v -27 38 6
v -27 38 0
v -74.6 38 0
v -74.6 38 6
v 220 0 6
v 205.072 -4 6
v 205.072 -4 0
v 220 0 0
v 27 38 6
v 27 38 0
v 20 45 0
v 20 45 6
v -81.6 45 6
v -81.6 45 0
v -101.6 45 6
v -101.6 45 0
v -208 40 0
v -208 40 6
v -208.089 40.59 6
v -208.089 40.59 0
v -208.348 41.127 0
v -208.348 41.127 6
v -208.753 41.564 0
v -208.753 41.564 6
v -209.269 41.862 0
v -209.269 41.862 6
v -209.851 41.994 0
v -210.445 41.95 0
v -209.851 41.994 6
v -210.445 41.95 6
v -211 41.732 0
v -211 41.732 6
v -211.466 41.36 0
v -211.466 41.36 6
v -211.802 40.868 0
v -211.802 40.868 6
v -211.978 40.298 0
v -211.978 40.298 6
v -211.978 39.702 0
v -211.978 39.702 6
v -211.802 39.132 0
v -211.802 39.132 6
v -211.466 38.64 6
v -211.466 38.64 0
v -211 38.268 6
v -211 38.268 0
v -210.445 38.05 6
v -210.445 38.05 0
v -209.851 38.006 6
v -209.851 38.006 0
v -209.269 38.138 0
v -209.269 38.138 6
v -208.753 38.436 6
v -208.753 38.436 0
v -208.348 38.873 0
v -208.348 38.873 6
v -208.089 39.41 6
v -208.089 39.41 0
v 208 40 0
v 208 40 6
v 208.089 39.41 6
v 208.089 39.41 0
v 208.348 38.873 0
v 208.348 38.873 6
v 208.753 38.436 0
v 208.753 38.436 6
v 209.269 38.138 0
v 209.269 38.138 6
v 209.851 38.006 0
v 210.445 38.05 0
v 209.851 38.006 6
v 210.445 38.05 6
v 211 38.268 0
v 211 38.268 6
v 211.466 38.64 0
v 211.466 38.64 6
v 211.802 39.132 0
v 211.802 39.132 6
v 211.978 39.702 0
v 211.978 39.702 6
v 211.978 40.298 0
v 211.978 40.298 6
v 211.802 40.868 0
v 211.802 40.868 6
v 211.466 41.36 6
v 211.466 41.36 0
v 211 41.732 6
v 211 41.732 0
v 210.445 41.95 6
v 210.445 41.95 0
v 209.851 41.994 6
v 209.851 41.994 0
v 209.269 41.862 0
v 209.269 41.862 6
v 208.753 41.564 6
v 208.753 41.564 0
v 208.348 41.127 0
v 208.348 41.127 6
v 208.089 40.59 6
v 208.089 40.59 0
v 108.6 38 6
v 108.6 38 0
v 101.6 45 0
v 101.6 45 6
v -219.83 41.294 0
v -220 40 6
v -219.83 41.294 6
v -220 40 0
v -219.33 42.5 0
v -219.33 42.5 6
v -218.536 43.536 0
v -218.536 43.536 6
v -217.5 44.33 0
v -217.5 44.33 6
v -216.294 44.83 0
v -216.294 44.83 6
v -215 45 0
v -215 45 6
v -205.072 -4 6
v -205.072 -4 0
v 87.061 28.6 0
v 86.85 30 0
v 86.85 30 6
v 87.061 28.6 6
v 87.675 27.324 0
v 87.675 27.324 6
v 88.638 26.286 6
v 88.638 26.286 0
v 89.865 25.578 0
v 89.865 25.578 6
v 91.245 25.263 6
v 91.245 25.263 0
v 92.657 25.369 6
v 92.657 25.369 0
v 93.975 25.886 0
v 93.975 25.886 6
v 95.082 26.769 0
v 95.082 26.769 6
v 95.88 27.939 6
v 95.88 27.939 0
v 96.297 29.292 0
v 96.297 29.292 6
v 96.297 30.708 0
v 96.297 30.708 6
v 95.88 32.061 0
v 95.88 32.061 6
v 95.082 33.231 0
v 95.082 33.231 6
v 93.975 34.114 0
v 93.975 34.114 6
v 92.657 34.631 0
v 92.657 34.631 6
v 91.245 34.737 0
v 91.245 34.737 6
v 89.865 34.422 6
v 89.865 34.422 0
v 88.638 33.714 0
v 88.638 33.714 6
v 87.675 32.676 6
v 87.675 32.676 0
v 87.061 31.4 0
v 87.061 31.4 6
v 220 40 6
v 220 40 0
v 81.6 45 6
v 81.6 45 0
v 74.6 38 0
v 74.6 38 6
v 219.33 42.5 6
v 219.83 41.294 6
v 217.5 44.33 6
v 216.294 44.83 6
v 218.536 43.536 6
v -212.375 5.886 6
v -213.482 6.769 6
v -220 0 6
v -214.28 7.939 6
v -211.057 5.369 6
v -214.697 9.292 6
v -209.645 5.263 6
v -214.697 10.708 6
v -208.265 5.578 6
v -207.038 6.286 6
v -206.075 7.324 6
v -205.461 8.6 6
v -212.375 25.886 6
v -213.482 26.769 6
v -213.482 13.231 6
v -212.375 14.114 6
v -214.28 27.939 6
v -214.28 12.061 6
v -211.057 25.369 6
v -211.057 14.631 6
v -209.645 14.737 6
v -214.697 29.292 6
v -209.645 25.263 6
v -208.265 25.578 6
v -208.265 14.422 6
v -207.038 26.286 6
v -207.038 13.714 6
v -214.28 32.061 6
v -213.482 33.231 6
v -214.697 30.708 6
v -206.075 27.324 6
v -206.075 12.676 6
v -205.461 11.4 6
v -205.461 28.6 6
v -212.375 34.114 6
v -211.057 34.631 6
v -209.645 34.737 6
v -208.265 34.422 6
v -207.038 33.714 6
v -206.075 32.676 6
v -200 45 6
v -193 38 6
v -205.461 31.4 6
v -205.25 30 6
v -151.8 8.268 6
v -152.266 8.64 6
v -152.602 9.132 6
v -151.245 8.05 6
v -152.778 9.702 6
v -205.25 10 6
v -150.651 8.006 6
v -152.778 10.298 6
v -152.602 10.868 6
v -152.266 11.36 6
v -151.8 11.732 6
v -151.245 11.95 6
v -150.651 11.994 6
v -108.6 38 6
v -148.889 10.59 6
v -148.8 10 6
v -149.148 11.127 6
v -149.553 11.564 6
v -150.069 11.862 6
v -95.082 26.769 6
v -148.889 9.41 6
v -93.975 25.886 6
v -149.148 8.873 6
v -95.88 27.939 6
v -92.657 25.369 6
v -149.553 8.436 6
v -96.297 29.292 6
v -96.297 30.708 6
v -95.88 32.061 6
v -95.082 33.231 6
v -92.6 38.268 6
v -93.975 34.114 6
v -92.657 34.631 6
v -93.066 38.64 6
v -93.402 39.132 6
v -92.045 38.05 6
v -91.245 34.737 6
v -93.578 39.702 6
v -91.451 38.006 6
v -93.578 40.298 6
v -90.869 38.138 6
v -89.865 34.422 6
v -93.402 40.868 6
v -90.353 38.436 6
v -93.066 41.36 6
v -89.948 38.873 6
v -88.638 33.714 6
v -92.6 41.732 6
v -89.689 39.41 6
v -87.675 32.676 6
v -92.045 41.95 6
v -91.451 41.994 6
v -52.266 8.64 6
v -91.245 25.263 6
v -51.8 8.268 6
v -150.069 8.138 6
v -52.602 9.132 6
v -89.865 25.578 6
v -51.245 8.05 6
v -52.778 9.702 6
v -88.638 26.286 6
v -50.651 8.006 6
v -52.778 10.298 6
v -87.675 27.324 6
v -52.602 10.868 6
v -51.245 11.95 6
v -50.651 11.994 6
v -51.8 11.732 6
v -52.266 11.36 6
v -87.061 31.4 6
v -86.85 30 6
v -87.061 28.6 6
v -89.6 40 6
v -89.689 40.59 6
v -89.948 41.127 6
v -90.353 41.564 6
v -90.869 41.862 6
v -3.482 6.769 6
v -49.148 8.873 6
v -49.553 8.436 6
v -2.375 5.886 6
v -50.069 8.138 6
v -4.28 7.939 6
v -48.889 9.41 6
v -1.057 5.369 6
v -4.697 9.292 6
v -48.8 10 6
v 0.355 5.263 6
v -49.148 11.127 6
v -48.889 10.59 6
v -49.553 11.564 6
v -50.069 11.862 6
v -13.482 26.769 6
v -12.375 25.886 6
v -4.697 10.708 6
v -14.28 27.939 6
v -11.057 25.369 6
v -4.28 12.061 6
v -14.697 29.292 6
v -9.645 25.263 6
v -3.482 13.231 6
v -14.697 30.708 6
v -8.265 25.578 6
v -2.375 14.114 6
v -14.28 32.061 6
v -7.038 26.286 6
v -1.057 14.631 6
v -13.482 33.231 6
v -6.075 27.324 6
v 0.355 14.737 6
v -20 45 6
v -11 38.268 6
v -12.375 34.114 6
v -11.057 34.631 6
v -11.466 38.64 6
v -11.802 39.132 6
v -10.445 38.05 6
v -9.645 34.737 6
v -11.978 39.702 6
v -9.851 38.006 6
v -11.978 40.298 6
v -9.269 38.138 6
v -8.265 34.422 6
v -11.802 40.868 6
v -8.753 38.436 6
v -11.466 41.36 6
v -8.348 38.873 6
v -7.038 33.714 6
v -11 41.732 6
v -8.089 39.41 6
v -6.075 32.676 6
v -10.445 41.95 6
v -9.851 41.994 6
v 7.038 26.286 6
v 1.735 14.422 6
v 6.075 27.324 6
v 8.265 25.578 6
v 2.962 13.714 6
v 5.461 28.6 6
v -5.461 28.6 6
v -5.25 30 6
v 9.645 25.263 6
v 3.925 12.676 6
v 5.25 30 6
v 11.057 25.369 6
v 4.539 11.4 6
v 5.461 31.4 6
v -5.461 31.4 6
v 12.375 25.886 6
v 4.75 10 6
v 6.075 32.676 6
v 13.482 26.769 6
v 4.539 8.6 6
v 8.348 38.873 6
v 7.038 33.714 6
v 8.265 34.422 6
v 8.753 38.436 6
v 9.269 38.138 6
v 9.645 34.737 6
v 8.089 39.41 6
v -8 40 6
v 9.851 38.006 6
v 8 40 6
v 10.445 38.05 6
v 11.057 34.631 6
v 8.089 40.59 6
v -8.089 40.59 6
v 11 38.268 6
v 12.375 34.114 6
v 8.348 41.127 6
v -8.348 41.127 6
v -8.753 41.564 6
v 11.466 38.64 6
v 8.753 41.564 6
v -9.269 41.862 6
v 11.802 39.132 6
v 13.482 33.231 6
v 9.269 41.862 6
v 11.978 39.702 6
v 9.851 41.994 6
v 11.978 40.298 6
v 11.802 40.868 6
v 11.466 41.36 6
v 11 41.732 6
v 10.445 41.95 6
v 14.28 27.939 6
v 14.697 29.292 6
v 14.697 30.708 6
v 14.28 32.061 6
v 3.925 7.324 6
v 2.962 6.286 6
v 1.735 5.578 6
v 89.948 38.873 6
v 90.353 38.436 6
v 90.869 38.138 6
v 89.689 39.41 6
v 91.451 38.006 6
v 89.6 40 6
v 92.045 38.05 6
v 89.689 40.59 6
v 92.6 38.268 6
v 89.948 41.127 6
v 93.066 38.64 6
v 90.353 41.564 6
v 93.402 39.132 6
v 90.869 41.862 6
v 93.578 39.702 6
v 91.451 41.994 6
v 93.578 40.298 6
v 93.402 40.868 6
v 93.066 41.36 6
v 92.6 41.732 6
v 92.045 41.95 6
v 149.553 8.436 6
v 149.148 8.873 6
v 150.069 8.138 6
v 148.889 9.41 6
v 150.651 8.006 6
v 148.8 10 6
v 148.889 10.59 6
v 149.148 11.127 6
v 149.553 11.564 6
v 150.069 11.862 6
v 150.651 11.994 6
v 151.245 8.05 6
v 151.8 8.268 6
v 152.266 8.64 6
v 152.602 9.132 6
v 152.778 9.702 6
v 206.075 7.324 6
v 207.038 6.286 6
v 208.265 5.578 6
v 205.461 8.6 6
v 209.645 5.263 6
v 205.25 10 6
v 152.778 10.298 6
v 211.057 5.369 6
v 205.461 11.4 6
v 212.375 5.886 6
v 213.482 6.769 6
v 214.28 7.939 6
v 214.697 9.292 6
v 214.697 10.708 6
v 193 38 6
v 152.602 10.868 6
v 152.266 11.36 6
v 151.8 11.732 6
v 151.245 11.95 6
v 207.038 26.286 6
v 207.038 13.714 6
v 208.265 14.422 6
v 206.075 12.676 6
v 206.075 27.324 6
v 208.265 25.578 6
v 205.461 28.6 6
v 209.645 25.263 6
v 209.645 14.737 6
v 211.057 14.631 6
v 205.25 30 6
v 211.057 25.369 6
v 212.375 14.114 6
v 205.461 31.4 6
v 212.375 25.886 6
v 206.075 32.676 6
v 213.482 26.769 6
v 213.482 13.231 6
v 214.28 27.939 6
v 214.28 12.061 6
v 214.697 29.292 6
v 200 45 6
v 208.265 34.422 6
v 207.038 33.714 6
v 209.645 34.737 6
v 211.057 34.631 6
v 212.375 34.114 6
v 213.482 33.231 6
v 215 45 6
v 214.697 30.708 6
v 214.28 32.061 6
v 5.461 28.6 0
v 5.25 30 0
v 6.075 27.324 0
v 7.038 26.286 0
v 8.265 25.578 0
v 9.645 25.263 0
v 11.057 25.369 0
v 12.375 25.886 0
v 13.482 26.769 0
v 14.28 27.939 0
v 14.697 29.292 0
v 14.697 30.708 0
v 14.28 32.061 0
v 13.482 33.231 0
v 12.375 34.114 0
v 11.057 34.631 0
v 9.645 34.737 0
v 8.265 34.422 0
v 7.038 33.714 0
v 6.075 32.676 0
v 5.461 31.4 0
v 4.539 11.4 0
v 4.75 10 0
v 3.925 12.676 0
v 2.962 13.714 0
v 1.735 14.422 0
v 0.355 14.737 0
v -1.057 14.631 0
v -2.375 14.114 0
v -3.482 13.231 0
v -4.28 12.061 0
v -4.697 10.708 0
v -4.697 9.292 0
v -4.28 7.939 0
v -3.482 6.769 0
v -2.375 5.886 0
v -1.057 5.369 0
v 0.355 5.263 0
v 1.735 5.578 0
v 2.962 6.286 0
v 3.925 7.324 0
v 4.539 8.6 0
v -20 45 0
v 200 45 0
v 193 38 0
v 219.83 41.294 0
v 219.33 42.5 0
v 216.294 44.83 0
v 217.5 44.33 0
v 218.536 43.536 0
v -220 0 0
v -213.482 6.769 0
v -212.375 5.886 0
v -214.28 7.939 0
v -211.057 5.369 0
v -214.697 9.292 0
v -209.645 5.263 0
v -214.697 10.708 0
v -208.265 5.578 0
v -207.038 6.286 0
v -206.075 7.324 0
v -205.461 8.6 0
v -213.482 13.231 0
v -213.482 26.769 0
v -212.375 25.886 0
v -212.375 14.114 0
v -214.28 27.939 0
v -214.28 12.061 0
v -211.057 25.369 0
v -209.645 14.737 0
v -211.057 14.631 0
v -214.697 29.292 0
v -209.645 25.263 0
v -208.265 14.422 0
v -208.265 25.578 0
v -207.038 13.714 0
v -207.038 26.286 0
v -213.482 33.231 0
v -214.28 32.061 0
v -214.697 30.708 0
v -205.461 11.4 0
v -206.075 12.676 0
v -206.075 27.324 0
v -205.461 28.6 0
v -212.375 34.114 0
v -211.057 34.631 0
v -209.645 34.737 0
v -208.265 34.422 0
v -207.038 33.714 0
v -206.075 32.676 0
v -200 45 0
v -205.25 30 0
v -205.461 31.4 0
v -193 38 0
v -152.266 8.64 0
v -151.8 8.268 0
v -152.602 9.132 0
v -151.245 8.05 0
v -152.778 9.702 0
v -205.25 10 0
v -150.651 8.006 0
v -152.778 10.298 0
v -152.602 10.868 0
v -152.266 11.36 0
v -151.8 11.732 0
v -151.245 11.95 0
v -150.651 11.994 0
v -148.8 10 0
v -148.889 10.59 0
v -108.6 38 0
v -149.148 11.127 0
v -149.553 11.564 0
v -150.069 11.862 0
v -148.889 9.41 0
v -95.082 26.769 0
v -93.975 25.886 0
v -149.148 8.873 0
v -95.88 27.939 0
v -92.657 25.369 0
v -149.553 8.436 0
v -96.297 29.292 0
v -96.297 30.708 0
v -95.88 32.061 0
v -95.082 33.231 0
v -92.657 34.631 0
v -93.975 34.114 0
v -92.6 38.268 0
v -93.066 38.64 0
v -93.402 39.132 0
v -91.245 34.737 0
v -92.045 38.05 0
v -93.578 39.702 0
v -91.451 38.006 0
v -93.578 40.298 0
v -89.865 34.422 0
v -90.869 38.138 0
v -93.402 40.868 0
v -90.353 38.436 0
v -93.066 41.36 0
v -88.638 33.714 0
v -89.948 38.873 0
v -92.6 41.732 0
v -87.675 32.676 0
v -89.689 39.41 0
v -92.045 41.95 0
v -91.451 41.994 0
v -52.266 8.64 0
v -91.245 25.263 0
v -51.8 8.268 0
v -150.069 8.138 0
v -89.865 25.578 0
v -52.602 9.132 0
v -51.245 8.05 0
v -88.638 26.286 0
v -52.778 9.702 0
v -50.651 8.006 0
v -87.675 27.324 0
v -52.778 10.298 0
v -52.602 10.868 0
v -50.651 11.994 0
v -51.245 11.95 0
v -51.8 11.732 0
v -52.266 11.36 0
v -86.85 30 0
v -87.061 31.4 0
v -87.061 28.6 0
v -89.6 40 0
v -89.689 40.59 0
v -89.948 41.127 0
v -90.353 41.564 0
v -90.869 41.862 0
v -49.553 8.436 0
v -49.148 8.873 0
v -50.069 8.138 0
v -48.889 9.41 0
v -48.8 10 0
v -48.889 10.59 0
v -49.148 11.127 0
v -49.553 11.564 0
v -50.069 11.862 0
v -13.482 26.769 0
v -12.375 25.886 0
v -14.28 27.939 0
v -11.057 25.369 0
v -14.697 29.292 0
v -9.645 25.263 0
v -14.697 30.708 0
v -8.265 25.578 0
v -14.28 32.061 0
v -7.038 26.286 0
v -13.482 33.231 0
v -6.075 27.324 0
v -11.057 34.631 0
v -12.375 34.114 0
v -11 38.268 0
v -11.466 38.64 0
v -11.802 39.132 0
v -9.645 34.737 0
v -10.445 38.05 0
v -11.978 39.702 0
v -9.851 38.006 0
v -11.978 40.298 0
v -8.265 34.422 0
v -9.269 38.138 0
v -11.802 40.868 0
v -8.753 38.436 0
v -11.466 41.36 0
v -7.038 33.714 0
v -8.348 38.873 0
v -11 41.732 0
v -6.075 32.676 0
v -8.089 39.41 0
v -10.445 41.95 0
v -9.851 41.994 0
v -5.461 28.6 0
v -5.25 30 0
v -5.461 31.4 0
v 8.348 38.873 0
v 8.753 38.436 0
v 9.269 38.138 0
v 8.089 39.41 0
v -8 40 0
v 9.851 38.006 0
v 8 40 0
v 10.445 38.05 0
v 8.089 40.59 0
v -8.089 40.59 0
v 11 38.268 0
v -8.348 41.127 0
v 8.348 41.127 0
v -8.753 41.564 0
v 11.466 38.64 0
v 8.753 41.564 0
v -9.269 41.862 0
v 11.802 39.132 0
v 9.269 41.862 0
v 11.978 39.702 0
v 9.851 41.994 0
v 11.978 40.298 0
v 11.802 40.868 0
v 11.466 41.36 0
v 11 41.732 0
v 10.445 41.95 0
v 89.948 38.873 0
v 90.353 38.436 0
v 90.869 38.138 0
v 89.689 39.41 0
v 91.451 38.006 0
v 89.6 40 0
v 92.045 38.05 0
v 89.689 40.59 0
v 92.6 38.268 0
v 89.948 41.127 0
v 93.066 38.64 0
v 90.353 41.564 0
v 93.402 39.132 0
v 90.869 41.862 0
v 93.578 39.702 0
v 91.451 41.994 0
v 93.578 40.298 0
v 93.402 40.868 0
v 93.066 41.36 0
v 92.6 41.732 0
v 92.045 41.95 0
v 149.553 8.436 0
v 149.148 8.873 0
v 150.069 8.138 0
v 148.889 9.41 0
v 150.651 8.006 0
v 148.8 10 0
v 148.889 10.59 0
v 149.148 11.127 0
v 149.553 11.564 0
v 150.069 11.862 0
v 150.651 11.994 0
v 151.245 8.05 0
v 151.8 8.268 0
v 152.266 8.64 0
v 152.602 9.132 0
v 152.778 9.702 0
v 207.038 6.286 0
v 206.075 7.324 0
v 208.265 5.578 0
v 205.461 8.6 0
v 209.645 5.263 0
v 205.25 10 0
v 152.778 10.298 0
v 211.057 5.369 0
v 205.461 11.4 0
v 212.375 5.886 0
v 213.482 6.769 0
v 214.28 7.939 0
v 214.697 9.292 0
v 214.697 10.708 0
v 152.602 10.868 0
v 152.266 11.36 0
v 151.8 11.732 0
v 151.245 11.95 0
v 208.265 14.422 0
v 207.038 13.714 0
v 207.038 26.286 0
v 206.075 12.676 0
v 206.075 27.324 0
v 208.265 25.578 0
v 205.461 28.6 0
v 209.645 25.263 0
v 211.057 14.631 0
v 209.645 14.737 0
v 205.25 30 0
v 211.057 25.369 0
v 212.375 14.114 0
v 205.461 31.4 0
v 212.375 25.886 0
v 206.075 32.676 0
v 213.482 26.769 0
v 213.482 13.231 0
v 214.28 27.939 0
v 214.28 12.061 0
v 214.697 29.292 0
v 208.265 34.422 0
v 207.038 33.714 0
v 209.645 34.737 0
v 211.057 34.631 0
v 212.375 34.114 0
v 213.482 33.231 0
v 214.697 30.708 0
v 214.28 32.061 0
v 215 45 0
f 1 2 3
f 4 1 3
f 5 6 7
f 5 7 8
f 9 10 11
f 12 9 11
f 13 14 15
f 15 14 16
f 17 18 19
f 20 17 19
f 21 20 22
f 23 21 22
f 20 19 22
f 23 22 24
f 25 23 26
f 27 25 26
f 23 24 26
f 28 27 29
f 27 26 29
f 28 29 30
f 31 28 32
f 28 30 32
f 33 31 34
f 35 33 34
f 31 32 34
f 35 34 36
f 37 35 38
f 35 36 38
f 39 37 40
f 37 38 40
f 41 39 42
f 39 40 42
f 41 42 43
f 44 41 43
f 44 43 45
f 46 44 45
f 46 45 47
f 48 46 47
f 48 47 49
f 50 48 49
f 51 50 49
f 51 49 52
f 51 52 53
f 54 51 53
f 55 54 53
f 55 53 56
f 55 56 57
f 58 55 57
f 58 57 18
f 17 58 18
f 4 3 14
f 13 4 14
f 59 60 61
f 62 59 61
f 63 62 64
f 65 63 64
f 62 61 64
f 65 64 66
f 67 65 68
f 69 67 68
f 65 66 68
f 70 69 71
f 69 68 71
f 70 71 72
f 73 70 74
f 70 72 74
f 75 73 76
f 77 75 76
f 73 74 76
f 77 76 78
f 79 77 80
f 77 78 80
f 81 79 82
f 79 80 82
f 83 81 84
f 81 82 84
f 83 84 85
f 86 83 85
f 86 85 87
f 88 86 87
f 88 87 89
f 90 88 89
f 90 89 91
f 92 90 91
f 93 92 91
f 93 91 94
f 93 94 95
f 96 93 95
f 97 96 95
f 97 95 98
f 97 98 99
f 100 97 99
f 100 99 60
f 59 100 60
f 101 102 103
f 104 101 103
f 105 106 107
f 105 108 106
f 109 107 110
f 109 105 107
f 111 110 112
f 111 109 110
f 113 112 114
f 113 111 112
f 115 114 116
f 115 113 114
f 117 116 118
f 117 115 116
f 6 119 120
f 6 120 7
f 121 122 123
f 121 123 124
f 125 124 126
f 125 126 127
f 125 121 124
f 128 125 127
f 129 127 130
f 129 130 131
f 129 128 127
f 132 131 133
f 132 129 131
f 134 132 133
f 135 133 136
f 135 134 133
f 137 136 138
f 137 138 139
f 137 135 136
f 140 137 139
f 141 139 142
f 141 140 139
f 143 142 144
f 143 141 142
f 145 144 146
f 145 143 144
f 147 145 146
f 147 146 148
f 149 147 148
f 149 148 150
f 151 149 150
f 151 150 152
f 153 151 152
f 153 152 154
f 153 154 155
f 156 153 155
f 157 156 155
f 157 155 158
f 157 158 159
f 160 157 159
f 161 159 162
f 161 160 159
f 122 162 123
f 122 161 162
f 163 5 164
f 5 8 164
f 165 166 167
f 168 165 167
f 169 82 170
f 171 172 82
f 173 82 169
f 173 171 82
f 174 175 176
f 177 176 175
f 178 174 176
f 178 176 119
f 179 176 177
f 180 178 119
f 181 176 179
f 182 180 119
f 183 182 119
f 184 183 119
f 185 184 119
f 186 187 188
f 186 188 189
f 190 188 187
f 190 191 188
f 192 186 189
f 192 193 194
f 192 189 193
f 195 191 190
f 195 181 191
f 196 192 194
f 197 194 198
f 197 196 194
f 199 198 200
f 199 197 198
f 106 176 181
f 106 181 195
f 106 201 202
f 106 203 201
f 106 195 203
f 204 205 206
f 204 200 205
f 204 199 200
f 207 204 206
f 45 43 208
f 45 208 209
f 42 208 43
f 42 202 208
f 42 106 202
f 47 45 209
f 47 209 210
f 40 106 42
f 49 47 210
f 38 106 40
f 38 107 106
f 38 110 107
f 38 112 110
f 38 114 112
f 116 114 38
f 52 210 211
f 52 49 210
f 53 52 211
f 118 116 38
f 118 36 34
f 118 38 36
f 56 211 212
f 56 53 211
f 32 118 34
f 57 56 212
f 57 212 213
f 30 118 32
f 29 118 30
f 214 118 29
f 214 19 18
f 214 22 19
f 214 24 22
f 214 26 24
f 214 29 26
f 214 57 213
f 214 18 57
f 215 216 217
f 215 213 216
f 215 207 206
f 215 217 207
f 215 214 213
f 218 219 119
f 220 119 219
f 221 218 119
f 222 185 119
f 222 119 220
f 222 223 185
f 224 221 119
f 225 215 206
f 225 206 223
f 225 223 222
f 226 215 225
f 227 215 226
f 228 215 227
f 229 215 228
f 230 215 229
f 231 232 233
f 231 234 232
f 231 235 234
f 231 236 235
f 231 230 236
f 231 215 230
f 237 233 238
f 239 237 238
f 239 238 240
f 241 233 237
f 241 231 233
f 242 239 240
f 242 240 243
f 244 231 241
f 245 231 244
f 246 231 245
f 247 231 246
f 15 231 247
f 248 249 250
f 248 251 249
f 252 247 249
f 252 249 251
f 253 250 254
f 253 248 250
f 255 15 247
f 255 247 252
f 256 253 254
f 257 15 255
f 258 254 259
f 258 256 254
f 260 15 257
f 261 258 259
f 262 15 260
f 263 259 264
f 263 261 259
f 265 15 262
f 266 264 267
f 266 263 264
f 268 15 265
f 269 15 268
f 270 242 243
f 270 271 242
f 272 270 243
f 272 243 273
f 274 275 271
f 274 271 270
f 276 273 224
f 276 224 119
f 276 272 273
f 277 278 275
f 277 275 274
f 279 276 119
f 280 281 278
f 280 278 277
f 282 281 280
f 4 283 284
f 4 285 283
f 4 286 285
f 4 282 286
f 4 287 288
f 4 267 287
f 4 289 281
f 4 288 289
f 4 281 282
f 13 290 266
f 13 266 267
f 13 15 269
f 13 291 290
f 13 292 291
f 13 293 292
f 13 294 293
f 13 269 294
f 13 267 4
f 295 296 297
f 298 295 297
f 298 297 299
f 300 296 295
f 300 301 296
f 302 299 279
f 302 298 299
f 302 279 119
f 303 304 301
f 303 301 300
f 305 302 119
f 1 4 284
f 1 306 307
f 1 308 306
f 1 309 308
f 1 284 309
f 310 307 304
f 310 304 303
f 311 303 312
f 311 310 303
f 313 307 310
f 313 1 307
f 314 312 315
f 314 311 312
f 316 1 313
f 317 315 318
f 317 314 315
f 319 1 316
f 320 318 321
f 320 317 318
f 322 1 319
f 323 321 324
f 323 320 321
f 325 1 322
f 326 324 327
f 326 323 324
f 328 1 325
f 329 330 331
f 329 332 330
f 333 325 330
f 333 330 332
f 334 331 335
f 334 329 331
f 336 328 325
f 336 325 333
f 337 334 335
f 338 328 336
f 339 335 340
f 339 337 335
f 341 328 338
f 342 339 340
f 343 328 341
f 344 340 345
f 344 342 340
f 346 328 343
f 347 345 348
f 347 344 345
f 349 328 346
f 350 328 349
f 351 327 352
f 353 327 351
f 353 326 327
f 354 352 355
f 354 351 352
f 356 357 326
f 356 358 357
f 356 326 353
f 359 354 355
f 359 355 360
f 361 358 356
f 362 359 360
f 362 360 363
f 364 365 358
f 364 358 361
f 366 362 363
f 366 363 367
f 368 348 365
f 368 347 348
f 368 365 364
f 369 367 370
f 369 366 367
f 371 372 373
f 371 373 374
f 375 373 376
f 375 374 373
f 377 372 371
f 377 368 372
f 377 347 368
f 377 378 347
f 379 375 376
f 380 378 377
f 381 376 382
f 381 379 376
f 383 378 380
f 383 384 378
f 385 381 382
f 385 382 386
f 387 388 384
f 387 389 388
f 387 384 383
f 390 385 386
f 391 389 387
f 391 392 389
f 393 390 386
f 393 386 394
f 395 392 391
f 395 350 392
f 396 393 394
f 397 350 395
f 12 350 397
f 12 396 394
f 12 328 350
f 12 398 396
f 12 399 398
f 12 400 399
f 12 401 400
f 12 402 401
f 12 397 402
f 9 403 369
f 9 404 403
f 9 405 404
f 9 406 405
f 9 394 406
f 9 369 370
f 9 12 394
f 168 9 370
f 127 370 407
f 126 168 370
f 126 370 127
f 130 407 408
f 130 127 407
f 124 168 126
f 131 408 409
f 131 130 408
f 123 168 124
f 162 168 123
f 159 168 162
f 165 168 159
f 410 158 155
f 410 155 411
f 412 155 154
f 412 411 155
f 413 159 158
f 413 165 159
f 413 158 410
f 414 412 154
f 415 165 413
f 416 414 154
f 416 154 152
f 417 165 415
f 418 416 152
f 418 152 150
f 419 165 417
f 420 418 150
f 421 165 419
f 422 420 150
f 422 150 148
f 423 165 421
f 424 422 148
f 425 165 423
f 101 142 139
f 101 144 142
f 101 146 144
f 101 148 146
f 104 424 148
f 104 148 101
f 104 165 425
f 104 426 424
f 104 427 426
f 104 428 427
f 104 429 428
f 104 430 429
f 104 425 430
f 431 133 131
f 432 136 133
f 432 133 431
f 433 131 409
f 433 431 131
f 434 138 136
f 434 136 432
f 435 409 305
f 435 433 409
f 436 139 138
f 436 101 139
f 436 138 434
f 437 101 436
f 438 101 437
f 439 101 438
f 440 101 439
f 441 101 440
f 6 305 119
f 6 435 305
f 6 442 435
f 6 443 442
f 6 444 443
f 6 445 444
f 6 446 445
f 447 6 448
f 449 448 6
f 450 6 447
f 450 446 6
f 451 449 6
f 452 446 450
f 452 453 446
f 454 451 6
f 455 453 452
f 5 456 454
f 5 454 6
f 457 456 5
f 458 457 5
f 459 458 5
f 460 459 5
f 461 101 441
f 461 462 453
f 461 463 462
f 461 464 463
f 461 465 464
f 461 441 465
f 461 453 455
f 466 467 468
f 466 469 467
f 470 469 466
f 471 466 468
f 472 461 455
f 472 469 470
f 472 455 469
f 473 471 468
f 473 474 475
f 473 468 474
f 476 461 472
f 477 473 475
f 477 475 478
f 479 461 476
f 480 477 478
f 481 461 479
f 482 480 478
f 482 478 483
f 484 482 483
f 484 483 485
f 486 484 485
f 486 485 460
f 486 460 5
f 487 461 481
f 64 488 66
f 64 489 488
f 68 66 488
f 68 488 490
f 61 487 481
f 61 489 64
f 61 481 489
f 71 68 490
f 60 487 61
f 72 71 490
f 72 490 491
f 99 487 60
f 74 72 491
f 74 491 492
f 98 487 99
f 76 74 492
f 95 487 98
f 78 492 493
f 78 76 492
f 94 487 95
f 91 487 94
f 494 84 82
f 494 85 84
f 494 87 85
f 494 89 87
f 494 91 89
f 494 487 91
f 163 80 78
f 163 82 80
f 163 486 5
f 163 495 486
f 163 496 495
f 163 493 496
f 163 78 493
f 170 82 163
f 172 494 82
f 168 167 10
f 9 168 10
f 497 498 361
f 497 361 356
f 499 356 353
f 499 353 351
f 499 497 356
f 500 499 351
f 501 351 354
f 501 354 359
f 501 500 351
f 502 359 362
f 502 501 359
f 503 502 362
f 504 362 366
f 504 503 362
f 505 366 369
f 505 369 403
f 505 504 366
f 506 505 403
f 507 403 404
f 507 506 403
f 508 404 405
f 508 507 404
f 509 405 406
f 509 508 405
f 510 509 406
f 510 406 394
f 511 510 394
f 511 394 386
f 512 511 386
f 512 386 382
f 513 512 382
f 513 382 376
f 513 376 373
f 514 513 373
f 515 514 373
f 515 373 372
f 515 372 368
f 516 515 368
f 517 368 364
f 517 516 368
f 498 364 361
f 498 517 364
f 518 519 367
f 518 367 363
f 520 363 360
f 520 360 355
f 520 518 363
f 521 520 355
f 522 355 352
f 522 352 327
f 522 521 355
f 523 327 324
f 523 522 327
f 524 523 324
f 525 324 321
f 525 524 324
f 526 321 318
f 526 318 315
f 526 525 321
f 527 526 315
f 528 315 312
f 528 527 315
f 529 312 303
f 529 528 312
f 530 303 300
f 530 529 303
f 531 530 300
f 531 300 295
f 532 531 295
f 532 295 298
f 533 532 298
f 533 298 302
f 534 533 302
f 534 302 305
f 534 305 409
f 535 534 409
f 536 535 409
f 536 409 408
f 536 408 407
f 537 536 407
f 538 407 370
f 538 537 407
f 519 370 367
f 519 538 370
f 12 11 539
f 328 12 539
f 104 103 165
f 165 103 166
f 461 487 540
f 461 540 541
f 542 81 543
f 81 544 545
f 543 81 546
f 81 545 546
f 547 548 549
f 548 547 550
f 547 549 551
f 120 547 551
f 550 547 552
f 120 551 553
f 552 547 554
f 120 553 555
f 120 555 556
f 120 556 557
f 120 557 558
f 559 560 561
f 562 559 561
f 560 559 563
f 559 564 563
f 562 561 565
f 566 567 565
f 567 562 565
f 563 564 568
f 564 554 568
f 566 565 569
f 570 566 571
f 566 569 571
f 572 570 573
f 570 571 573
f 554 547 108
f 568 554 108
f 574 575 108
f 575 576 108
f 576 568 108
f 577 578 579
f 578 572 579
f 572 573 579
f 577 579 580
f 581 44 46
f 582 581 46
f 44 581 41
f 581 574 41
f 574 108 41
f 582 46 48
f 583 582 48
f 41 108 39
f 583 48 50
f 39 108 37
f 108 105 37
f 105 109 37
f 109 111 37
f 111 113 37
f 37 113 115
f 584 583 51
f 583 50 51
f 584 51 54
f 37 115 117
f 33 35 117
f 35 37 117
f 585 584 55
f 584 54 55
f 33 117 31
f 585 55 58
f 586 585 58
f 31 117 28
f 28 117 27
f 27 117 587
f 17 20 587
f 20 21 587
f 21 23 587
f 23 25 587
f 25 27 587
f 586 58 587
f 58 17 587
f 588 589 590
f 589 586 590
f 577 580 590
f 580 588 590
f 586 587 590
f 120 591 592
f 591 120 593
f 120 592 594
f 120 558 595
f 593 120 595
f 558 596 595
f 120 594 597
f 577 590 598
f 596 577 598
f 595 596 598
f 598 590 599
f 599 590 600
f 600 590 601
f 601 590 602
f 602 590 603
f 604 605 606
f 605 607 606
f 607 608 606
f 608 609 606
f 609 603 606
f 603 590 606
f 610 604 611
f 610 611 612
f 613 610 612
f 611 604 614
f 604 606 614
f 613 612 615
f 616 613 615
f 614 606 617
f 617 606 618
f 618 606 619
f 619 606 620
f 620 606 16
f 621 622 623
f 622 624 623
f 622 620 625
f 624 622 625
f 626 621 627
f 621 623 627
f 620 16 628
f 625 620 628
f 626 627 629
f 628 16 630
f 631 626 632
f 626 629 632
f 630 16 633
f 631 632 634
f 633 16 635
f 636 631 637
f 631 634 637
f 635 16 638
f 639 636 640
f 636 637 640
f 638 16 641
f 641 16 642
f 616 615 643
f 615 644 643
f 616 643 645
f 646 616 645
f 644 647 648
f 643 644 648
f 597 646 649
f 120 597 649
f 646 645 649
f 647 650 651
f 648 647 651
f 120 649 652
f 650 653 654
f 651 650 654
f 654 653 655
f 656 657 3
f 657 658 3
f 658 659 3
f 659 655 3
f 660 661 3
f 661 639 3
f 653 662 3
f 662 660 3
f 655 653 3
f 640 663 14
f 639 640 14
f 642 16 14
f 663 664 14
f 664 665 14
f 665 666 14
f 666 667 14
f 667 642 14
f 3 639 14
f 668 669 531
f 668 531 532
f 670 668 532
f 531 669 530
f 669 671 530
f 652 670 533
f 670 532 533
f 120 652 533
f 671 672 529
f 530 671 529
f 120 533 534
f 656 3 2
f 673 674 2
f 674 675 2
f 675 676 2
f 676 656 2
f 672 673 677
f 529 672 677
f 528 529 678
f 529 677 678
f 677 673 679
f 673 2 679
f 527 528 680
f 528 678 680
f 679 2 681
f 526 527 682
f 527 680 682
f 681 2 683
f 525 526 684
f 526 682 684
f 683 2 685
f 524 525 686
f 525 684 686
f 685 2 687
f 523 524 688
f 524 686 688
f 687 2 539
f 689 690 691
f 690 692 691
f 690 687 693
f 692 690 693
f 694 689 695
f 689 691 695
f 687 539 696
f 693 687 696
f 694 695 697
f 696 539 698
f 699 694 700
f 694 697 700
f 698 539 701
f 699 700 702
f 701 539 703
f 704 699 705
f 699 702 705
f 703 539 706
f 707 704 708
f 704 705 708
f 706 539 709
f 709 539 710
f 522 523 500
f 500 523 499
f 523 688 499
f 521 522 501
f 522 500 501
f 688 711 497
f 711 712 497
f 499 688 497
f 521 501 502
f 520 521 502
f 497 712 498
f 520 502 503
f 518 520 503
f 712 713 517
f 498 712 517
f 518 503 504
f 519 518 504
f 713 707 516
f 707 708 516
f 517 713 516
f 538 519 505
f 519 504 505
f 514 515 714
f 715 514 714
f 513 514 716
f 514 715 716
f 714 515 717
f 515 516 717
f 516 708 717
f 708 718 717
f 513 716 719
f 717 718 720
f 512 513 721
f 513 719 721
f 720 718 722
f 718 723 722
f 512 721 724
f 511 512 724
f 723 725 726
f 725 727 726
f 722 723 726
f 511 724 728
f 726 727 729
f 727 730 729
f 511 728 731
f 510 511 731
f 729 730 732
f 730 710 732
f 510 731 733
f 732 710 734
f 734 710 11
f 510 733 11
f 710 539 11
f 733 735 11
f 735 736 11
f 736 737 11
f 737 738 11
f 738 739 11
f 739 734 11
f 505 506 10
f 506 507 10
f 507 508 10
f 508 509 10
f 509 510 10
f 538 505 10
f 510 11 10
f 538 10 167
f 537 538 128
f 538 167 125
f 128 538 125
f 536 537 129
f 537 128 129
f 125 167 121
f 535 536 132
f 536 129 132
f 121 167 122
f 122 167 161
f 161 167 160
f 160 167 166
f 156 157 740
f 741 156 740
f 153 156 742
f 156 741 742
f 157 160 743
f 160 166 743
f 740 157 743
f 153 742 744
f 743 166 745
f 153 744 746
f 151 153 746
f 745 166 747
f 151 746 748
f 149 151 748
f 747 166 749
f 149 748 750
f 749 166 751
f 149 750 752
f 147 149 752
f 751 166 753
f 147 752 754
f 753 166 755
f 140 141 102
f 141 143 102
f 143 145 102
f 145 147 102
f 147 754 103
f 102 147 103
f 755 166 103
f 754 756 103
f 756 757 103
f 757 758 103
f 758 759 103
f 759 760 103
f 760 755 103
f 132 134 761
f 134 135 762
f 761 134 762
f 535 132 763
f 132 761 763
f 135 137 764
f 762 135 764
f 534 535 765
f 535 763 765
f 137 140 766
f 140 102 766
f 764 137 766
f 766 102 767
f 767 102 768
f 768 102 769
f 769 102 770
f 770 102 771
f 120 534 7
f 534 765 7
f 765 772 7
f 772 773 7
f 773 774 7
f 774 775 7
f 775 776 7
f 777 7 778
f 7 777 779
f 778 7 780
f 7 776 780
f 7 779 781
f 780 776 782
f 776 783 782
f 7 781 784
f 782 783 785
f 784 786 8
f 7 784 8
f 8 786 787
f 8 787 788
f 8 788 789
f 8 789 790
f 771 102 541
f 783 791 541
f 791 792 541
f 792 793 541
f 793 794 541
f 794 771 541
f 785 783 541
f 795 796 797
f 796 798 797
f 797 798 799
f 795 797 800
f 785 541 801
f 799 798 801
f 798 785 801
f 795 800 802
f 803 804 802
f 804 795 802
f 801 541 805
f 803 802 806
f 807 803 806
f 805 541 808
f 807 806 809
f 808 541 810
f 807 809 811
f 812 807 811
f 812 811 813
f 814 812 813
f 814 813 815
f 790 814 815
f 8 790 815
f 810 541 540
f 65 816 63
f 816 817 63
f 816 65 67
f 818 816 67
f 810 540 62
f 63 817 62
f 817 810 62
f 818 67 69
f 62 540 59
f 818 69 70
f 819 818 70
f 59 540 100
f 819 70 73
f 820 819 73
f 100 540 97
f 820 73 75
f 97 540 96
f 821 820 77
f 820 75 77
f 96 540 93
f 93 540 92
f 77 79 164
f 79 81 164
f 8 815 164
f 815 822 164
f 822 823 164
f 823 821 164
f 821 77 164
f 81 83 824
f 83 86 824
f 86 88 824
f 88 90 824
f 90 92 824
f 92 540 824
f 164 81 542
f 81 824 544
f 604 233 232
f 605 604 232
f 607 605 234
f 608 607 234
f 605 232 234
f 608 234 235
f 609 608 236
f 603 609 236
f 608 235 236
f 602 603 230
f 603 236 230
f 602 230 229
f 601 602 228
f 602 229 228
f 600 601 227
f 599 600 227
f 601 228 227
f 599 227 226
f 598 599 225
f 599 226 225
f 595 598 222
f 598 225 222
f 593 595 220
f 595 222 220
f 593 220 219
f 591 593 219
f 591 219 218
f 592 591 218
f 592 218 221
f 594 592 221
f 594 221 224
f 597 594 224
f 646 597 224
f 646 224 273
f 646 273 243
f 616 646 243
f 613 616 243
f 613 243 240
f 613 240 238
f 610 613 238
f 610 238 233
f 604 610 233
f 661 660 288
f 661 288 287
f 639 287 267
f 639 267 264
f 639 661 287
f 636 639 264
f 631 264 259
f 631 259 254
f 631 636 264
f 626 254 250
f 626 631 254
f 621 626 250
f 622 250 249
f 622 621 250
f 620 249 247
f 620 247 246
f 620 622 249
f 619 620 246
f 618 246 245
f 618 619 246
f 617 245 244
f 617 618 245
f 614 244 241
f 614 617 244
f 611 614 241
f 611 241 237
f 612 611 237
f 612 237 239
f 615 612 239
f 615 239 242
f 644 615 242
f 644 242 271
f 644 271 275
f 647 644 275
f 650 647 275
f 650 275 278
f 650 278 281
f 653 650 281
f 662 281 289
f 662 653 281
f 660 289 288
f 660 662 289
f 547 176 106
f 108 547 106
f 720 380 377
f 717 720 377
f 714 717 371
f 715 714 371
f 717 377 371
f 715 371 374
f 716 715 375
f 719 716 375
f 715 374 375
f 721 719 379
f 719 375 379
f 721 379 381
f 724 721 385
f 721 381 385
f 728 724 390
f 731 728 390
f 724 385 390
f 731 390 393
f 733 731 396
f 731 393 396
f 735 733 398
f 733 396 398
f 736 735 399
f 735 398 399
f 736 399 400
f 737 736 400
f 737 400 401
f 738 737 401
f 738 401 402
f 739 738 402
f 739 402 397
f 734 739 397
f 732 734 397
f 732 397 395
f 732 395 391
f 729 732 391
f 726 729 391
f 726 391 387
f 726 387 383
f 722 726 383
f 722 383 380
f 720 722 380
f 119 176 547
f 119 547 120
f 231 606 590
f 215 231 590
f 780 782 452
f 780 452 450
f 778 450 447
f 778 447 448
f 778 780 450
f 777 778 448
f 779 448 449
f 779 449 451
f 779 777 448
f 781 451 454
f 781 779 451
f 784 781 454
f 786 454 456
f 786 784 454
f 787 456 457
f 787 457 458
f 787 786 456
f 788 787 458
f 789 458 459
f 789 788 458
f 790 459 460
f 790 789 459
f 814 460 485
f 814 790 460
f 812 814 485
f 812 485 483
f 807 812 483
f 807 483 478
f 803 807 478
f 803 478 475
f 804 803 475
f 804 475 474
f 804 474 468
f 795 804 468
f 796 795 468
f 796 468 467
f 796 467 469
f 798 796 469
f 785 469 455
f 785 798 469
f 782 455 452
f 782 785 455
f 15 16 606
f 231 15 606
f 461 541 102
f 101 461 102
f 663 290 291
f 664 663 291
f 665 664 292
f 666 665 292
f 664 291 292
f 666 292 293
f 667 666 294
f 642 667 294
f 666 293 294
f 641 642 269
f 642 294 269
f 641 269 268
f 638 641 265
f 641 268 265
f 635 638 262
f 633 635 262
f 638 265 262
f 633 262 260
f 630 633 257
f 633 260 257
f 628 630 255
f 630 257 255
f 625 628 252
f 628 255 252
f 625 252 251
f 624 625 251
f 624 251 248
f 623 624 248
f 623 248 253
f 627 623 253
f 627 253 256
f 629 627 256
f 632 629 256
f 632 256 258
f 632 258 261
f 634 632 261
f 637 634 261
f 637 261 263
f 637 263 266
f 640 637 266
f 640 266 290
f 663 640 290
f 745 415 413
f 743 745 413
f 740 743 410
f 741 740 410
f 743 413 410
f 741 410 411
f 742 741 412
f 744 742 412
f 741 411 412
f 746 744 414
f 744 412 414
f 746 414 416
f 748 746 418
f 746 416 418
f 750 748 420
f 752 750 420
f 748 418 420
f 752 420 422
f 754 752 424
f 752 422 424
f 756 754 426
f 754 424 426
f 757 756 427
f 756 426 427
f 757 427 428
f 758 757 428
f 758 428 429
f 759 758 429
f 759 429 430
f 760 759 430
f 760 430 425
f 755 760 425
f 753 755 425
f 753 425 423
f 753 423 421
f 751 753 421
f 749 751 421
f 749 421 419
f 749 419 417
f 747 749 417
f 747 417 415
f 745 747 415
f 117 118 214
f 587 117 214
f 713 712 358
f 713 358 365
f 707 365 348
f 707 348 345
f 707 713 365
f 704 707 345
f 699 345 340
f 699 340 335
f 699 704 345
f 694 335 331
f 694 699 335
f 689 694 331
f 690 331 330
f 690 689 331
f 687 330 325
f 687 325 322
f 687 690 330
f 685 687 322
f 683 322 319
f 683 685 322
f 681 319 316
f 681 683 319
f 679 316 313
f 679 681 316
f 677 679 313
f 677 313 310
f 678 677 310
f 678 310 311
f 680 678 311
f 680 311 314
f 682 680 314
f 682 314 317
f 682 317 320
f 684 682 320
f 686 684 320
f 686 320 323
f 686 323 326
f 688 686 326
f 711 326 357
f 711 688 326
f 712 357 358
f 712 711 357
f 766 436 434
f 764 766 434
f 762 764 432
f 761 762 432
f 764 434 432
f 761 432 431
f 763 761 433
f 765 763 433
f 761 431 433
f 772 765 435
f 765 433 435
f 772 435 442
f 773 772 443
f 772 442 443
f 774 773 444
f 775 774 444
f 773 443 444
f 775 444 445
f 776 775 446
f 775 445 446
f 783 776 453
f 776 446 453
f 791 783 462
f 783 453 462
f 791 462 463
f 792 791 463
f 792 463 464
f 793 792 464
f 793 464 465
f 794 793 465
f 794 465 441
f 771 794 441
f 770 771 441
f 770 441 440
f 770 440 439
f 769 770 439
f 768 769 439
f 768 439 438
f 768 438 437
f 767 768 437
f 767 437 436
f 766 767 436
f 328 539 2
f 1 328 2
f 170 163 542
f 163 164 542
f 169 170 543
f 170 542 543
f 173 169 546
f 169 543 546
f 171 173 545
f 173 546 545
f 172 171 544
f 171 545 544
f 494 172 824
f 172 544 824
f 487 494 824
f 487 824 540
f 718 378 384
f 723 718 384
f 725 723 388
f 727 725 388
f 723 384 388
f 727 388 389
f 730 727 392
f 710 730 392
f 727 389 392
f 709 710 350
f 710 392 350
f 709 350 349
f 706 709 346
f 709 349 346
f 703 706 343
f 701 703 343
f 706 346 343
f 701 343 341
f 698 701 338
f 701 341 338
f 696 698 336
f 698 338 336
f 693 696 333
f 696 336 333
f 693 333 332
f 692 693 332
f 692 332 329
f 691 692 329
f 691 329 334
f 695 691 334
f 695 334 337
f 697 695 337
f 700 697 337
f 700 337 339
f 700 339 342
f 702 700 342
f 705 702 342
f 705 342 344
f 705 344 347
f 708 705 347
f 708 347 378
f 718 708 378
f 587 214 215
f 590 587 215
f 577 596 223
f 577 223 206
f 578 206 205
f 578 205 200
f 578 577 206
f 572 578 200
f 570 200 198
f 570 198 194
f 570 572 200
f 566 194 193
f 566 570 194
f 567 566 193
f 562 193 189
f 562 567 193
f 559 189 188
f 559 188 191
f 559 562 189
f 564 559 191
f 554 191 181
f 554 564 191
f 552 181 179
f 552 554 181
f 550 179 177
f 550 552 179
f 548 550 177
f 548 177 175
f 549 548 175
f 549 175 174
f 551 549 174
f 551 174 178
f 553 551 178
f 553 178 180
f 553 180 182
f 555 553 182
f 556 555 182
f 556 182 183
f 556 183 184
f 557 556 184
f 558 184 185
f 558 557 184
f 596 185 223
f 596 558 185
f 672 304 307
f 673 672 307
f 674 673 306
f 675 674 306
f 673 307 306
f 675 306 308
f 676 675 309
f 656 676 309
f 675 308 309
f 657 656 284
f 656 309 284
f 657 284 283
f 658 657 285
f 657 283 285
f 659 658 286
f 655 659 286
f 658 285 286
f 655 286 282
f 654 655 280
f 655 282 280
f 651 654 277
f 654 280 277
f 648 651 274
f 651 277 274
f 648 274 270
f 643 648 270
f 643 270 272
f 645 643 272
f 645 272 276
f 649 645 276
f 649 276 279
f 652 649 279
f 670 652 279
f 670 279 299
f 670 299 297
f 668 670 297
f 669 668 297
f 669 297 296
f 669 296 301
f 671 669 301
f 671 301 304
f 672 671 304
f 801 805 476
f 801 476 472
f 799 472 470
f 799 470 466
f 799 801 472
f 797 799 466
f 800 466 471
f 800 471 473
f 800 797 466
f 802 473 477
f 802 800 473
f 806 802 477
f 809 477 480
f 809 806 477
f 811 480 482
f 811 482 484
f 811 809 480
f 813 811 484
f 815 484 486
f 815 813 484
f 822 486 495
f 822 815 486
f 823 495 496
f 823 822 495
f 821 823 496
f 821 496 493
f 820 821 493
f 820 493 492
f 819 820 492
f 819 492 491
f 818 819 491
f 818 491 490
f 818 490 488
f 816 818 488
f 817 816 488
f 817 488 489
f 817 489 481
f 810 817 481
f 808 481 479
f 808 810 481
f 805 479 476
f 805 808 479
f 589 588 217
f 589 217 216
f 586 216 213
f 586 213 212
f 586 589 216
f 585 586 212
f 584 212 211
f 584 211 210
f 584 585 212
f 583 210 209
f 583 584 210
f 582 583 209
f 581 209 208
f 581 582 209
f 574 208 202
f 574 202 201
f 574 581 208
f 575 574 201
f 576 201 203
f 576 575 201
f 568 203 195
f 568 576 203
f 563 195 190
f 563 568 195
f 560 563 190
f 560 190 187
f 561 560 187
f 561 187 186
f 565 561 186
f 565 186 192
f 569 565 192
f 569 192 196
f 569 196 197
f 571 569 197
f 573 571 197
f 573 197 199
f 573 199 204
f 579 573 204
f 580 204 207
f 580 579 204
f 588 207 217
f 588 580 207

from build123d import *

# Parameters (mm, degrees)
CROQUIS1_R              = 4.75
SALIENTE_EXTRUIR1_DEPTH = 6
SALIENTE_EXTRUIR2_DEPTH = 6
CROQUIS3_R              = 2
CORTAR_EXTRUIR1_DEPTH   = 225.635259922
SALIENTE_EXTRUIR3_DEPTH = 6
REDONDEO3_R             = 5


with BuildPart() as part:
    # Croquis1 → Saliente-Extruir1 (new body)
    with BuildSketch(Plane.XY):
        Polygon((-220, 0), (220, 0), (220, 38), (108.6, 38), (101.6, 45), (81.6, 45), (74.6, 38), (27, 38), (20, 45), (-20, 45), (-27, 38), (-74.6, 38), (-81.6, 45), (-101.6, 45), (-108.6, 38), (-220, 38), align=None)
        with Locations((-210, 10)):
            Circle(CROQUIS1_R, mode=Mode.SUBTRACT)
        with Locations((-210, 30)):
            Circle(CROQUIS1_R, mode=Mode.SUBTRACT)
        with Locations(Location((210, 10, 0), (0, 0, 180))):
            Circle(CROQUIS1_R, mode=Mode.SUBTRACT)
        with Locations(Location((210, 30, 0), (0, 0, 180))):
            Circle(CROQUIS1_R, mode=Mode.SUBTRACT)
        with Locations((-91.6, 30)):
            Circle(CROQUIS1_R, mode=Mode.SUBTRACT)
        with Locations((-10, 30)):
            Circle(CROQUIS1_R, mode=Mode.SUBTRACT)
        with Locations(Location((10, 30, 0), (0, 0, 180))):
            Circle(CROQUIS1_R, mode=Mode.SUBTRACT)
        with Locations(Location((91.6, 30, 0), (0, 0, 180))):
            Circle(CROQUIS1_R, mode=Mode.SUBTRACT)
        with Locations((0, 10)):
            Circle(CROQUIS1_R, mode=Mode.SUBTRACT)
    extrude(amount=SALIENTE_EXTRUIR1_DEPTH)

    # Croquis2 → Saliente-Extruir2 (add)
    with BuildSketch(Plane.XY.offset(6)):
        Polygon((-220, 38), (-220, 45), (-200, 45), (-193, 38), align=None)
        Polygon((200, 45), (193, 38), (220, 38), (220, 45), align=None)
    extrude(amount=-SALIENTE_EXTRUIR2_DEPTH)

    # Croquis3 → Cortar-Extruir1 (cut, through all)
    with BuildSketch(Plane.XY.offset(6)):
        with Locations((-91.6, 40)):
            Circle(CROQUIS3_R)
        with Locations((-210, 40)):
            Circle(CROQUIS3_R)
        with Locations((-10, 40)):
            Circle(CROQUIS3_R)
        with Locations(Location((10, 40, 0), (0, 0, 180))):
            Circle(CROQUIS3_R)
        with Locations(Location((91.6, 40, 0), (0, 0, 180))):
            Circle(CROQUIS3_R)
        with Locations(Location((210, 40, 0), (0, 0, 180))):
            Circle(CROQUIS3_R)
        with Locations((-150.8, 10)):
            Circle(CROQUIS3_R)
        with Locations((-50.8, 10)):
            Circle(CROQUIS3_R)
        with Locations(Location((150.8, 10, 0), (0, 0, 180))):
            Circle(CROQUIS3_R)
    extrude(amount=-CORTAR_EXTRUIR1_DEPTH, mode=Mode.SUBTRACT)

    # Croquis4 → Saliente-Extruir3 (add)
    with BuildSketch(Plane.XY.offset(6)):
        Polygon((220, 0), (-220, 0), (-205.07179677, -4), (205.07179677, -4), align=None)
    extrude(amount=-SALIENTE_EXTRUIR3_DEPTH)

    # Redondeo3
    redondeo3_edges = [part.edges().sort_by_distance(p)[0] for p in [
        (-220, 45, 3),
        (220, 45, 3),
    ]]
    fillet(redondeo3_edges, radius=REDONDEO3_R)


solid = part.part
